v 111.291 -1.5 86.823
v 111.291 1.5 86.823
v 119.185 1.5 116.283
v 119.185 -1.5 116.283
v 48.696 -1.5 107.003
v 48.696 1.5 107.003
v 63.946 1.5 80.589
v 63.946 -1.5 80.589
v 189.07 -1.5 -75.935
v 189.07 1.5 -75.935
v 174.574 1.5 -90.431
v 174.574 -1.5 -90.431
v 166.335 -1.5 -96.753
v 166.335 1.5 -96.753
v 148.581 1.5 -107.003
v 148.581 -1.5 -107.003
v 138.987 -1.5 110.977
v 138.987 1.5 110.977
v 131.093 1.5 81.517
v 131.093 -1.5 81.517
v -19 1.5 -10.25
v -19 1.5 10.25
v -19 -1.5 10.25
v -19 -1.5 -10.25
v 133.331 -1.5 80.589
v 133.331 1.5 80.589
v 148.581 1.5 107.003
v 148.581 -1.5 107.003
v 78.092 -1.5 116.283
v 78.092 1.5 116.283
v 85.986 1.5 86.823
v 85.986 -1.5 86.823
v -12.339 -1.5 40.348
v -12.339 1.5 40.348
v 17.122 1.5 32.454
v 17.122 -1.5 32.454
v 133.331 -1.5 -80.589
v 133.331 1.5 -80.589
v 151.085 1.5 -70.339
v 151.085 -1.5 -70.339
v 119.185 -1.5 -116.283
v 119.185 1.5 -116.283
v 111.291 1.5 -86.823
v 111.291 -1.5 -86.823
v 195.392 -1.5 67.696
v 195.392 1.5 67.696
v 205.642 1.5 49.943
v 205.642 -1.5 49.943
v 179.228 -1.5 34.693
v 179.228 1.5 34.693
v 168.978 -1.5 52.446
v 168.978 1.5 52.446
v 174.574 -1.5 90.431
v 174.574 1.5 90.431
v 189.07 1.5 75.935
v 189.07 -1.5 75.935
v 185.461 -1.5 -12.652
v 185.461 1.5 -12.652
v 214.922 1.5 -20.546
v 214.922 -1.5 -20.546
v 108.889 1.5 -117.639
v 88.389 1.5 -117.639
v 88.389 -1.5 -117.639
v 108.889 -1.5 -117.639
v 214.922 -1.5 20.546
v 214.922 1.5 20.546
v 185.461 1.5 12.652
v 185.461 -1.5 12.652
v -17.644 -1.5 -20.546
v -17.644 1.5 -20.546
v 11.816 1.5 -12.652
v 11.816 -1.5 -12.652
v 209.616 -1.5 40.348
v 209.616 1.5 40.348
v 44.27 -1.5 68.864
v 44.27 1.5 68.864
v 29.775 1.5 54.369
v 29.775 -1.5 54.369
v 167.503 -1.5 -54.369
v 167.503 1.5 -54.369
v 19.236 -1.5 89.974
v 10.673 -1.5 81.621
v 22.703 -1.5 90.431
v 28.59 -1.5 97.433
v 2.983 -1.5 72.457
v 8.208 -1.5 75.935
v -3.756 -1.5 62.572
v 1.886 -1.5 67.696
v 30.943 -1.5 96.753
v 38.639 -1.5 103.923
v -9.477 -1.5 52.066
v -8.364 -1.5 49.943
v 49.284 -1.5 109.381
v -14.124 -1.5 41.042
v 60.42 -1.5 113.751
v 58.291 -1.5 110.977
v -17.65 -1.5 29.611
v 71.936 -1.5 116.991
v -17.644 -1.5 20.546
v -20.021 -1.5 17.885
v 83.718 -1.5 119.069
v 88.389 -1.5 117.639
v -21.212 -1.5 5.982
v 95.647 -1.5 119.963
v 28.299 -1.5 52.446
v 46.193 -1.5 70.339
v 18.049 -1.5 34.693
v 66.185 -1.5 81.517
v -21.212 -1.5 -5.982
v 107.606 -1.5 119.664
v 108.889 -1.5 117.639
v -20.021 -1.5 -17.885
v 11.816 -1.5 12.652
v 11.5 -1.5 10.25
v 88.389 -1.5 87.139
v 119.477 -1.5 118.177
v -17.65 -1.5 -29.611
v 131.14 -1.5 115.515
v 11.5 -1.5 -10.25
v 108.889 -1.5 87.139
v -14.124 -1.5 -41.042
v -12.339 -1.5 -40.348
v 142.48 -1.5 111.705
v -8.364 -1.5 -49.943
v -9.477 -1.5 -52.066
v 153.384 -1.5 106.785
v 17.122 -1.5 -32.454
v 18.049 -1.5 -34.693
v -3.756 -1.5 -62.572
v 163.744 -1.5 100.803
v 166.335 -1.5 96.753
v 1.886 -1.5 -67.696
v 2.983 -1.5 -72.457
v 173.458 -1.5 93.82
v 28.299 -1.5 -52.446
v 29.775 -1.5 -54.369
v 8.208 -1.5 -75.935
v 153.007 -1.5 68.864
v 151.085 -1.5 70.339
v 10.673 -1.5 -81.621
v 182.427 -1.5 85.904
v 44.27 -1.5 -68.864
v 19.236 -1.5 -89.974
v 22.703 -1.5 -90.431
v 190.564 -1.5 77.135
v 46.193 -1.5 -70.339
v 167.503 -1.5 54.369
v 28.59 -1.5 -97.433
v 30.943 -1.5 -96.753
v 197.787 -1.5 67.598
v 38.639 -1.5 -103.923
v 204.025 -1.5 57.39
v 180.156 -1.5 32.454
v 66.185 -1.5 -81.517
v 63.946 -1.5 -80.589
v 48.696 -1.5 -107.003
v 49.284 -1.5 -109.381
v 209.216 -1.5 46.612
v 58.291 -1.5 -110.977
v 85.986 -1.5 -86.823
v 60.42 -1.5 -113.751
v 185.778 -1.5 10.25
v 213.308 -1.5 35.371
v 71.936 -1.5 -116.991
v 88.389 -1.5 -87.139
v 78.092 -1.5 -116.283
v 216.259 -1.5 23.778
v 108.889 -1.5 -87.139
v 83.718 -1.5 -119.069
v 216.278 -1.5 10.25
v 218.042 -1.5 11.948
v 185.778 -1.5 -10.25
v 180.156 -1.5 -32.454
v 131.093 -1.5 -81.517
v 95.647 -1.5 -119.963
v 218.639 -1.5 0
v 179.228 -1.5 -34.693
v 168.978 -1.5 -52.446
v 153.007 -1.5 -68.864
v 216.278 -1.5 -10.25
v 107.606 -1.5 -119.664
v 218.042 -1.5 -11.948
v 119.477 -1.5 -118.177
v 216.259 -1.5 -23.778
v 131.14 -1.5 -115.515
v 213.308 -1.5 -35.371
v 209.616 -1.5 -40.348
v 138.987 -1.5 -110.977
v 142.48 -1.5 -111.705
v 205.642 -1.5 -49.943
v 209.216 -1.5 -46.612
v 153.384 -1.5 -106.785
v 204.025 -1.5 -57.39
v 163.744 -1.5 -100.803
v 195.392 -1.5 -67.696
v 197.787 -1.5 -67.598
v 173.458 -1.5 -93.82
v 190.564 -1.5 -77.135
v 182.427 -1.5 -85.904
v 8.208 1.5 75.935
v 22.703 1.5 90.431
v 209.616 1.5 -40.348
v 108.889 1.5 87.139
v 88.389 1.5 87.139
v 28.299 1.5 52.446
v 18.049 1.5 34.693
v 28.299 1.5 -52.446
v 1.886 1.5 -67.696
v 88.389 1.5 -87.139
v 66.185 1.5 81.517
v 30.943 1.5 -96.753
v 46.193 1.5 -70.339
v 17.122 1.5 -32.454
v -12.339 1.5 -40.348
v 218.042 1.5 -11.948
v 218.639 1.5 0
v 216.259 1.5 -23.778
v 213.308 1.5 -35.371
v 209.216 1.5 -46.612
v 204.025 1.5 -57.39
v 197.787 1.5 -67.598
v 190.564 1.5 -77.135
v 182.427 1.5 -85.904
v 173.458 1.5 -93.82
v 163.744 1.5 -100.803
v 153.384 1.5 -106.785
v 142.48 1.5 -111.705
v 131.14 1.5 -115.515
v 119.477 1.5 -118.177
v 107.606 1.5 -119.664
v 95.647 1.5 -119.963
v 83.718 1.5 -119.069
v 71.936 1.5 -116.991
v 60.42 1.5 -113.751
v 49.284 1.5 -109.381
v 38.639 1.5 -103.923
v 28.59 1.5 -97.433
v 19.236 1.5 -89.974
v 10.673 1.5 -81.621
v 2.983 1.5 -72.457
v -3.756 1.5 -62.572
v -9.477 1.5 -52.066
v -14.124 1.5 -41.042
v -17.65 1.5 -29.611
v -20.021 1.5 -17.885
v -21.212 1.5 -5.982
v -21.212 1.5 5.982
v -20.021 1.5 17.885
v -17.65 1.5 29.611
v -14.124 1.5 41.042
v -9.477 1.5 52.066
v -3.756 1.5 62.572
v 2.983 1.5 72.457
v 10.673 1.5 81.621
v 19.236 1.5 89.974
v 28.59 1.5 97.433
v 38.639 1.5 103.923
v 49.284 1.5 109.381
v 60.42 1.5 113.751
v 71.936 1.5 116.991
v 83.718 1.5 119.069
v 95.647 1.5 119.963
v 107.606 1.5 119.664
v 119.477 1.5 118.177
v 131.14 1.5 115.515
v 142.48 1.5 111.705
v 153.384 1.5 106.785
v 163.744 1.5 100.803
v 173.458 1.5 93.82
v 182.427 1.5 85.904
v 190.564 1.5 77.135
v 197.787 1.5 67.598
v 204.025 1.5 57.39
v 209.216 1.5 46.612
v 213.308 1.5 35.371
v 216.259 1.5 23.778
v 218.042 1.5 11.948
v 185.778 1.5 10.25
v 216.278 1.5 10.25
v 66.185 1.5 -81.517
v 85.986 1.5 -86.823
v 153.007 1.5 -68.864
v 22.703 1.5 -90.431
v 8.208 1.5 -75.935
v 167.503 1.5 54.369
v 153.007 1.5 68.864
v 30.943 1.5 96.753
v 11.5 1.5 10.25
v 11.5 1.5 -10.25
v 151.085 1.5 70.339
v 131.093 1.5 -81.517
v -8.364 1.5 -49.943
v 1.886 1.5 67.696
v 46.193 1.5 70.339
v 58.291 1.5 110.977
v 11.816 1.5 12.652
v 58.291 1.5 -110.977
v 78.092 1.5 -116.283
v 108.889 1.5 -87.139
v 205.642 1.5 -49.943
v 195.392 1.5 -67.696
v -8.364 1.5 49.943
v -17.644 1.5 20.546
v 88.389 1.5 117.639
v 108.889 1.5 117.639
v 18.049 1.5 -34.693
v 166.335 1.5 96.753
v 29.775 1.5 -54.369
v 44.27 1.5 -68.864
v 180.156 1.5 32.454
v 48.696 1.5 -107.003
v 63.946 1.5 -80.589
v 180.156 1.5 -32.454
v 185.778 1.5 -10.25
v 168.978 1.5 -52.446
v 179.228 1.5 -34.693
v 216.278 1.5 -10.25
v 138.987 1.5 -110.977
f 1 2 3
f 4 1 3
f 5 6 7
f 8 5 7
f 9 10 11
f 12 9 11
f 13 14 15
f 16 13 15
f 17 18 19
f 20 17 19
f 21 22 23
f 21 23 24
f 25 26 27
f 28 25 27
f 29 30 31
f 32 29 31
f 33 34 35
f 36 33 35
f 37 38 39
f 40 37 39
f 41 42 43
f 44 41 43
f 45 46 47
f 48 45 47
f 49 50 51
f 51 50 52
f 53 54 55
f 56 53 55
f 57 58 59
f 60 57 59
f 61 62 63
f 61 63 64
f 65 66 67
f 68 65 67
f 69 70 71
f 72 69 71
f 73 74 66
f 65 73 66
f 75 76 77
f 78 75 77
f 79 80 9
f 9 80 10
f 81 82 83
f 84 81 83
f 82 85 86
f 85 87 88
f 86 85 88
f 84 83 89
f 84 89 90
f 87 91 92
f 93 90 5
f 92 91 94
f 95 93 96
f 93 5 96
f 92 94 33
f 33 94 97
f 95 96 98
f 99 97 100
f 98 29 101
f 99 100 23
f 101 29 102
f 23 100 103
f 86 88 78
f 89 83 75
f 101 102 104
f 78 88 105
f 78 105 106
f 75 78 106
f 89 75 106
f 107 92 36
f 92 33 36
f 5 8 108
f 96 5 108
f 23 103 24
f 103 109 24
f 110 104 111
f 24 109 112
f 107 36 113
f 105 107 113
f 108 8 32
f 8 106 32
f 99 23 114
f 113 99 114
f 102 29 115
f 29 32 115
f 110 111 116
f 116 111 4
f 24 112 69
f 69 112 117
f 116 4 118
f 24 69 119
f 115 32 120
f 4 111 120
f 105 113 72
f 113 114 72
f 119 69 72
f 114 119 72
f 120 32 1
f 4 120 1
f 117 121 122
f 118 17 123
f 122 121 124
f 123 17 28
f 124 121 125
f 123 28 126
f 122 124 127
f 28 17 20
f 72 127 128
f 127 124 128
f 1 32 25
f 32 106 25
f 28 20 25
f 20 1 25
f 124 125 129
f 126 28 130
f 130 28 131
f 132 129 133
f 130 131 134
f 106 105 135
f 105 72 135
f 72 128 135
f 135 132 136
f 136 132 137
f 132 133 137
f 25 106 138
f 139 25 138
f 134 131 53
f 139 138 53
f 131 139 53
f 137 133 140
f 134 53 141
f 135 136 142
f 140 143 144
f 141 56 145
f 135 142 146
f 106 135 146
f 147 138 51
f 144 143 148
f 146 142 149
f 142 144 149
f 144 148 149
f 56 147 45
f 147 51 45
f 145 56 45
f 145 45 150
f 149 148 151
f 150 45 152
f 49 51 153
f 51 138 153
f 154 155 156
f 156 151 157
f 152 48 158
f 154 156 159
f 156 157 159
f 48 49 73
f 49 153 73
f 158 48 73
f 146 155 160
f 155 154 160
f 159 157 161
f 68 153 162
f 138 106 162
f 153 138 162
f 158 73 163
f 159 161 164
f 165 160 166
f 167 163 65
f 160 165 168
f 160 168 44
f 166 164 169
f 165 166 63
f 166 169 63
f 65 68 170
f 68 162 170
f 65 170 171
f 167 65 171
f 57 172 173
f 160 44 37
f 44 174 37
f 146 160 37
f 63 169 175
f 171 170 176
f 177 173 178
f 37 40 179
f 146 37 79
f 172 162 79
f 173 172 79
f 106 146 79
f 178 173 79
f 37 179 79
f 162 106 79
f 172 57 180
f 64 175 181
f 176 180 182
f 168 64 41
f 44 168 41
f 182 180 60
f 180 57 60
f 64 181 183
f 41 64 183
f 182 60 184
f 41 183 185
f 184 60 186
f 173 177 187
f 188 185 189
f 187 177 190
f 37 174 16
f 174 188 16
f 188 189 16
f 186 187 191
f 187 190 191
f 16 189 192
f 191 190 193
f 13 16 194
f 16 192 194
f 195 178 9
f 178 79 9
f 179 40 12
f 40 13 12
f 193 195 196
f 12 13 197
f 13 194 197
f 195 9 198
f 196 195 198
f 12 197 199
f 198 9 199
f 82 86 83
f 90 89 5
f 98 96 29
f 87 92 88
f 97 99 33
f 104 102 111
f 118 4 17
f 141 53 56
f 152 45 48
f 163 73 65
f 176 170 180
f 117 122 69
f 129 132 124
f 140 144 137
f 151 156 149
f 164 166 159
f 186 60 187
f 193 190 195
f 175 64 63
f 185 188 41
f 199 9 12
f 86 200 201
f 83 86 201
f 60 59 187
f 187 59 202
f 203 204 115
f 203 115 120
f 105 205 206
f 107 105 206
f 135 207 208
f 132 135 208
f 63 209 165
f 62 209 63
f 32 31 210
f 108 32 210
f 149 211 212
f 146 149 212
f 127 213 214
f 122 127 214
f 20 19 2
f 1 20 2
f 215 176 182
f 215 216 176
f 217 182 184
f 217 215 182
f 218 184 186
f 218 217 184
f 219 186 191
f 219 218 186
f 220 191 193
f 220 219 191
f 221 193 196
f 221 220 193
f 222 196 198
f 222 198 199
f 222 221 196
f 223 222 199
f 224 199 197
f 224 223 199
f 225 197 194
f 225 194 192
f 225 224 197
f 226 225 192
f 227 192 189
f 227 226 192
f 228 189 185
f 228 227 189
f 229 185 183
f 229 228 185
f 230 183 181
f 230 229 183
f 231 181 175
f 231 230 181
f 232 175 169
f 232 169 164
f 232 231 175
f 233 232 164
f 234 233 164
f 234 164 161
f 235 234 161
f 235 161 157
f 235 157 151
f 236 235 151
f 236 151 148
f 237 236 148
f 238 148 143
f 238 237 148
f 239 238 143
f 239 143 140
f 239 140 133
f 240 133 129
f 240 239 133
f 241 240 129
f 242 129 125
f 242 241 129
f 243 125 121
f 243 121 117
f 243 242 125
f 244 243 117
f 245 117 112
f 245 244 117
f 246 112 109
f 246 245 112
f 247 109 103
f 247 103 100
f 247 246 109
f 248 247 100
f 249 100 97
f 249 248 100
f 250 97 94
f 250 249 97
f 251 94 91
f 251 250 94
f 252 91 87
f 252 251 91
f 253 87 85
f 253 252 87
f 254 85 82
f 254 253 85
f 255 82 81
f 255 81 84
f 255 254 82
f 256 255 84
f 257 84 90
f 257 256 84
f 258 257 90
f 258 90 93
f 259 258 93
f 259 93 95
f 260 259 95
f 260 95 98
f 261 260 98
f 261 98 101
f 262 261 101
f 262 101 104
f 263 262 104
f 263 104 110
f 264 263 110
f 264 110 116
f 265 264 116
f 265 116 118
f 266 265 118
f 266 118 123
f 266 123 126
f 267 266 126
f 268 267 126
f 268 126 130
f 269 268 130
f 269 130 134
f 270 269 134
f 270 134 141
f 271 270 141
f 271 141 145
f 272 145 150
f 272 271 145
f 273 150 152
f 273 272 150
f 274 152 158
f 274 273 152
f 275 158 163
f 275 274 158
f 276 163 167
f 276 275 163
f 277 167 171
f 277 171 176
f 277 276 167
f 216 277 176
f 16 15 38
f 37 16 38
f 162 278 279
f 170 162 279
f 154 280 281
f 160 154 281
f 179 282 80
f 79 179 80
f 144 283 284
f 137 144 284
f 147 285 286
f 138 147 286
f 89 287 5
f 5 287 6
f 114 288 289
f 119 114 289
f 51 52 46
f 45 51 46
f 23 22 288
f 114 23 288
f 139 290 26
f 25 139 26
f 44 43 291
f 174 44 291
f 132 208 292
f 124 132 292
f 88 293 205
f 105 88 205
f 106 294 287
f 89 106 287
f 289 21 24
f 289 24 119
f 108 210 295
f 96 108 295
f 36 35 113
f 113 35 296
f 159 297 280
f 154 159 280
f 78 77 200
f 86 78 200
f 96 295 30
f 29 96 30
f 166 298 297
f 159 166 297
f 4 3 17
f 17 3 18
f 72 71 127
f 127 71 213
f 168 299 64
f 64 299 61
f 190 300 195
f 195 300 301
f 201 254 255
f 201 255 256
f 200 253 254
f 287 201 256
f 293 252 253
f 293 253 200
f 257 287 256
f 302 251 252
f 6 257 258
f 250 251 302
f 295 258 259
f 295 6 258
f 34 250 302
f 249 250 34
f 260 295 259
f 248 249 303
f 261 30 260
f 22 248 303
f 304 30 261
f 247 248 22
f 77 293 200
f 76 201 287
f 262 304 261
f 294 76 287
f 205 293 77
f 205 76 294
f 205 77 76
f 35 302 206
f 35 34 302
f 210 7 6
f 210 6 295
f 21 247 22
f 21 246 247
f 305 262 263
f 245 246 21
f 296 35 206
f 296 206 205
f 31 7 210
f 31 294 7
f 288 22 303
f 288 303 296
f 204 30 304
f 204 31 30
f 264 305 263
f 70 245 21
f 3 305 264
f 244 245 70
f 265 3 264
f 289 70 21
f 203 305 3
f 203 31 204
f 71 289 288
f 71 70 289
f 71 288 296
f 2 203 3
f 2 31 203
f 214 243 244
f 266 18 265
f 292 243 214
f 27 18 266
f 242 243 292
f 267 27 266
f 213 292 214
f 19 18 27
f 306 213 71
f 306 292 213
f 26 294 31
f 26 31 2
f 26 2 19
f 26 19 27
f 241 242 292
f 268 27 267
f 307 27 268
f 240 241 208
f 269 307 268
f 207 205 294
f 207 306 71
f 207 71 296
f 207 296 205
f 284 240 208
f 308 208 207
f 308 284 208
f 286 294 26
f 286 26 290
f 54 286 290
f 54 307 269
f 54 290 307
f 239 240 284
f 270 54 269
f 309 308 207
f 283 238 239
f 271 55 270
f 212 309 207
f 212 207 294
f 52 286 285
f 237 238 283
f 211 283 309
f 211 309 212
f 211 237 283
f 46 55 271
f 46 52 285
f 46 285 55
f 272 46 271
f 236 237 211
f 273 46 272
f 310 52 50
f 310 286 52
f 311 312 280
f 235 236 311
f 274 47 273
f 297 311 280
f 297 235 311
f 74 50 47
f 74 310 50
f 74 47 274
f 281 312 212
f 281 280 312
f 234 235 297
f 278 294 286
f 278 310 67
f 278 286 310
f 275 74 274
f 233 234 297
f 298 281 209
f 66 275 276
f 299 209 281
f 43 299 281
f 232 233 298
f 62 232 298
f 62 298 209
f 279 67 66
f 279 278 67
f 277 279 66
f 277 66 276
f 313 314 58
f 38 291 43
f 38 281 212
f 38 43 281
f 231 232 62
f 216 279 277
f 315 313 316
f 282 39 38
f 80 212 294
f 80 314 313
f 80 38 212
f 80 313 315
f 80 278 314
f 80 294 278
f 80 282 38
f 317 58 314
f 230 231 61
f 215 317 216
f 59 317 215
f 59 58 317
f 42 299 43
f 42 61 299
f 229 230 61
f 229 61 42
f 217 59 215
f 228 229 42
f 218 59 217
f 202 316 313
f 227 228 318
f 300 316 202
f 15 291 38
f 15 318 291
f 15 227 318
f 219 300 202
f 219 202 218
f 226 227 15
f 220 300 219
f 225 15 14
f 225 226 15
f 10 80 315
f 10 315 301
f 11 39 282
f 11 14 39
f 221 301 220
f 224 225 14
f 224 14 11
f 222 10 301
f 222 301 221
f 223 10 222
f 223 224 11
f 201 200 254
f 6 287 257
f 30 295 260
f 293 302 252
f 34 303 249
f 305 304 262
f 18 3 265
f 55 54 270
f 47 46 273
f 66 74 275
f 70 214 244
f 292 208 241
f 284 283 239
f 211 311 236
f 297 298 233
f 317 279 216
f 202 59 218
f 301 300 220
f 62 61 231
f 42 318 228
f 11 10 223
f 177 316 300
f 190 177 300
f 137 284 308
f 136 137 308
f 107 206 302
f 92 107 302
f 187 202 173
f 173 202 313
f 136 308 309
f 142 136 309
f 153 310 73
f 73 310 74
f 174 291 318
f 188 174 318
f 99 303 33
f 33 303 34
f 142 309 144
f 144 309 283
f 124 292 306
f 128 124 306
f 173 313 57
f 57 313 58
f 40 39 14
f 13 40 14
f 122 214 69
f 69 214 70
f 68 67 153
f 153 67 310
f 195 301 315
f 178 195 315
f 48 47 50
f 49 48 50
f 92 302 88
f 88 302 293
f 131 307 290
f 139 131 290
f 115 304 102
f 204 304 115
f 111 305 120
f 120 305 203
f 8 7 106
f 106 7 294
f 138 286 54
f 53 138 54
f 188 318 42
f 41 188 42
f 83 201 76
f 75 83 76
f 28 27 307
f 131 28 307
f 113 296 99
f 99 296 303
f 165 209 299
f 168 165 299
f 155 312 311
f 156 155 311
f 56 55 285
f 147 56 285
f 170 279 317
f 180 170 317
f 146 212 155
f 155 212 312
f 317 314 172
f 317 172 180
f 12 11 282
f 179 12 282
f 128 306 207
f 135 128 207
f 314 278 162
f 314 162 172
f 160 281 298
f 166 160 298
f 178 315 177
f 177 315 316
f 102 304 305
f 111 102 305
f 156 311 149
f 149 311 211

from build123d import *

# Parameters (mm, degrees)
SKETCH1_R           = 120
BOSS_EXTRUDE1_DEPTH = 1.5
SKETCH6_W           = 30.5
SKETCH6_H           = 20.5
SKETCH6_W_2         = 20.5
SKETCH6_H_2         = 30.5
CUT_EXTRUDE1_DEPTH  = 10.5


with BuildPart() as part:
    # Sketch1 → Boss-Extrude1 (new, symmetric)
    with BuildSketch(Plane(origin=(0, 0, 0), x_dir=(1, 0, 0), z_dir=(0, 1, 0))):
        with Locations((98.638798209, 0)):
            Circle(SKETCH1_R)
    extrude(amount=BOSS_EXTRUDE1_DEPTH, both=True)

    # Sketch6 → Cut-Extrude1 (cut)
    with BuildSketch(Plane(origin=(0, 1.5, 0), x_dir=(1, 0, 0), z_dir=(0, 1, 0))):
        with Locations((-3.75, 0)):
            Rectangle(SKETCH6_W, SKETCH6_H)
        Polygon((-12.338659942, 40.347901139), (-17.644450367, 20.5464217), (11.816287335, 12.652440824), (17.122077759, 32.453920263), align=None)
        Polygon((1.885610489, 67.696159493), (-8.364389511, 49.942638716), (18.049385305, 34.692638716), (28.299385305, 52.446159493), align=None)
        Polygon((22.703450772, 90.431036452), (8.207761758, 75.935347437), (29.774518584, 54.368590611), (44.270207598, 68.864279625), align=None)
        Polygon((48.696159493, 107.00318772), (30.942638716, 96.75318772), (46.192638716, 70.339412904), (63.946159493, 80.589412904), align=None)
        Polygon((78.092376509, 116.283248576), (58.29089707, 110.977458152), (66.184877946, 81.51672045), (85.986357385, 86.822510874), align=None)
        with Locations((98.638798209, 102.388798209)):
            Rectangle(SKETCH6_W_2, SKETCH6_H_2)
        Polygon((138.986699348, 110.977458152), (119.185219909, 116.283248576), (111.291239034, 86.822510874), (131.092718473, 81.51672045), align=None)
        Polygon((166.334957703, 96.75318772), (148.581436925, 107.00318772), (133.331436925, 80.589412904), (151.084957703, 70.339412904), align=None)
        Polygon((189.069834661, 75.935347437), (174.574145646, 90.431036452), (153.00738882, 68.864279625), (167.503077834, 54.368590611), align=None)
        Polygon((205.641985929, 49.942638716), (195.391985929, 67.696159493), (168.978211114, 52.446159493), (179.228211114, 34.692638716), align=None)
        Polygon((214.922046785, 20.5464217), (209.616256361, 40.347901139), (180.155518659, 32.453920263), (185.461309084, 12.652440824), align=None)
        with Locations((201.027596418, 0)):
            Rectangle(SKETCH6_W, SKETCH6_H)
        Polygon((209.616256361, -40.347901139), (214.922046785, -20.5464217), (185.461309084, -12.652440824), (180.155518659, -32.453920263), align=None)
        Polygon((195.391985929, -67.696159493), (205.641985929, -49.942638716), (179.228211114, -34.692638716), (168.978211114, -52.446159493), align=None)
        Polygon((174.574145646, -90.431036451), (189.069834661, -75.935347437), (167.503077835, -54.368590611), (153.00738882, -68.864279625), align=None)
        Polygon((148.581436925, -107.00318772), (166.334957703, -96.75318772), (151.084957703, -70.339412904), (133.331436925, -80.589412904), align=None)
        Polygon((119.185219909, -116.283248576), (138.986699348, -110.977458152), (131.092718473, -81.51672045), (111.291239034, -86.822510874), align=None)
        with Locations((98.638798209, -102.388798209)):
            Rectangle(SKETCH6_W_2, SKETCH6_H_2)
        Polygon((58.29089707, -110.977458152), (78.092376509, -116.283248576), (85.986357385, -86.822510874), (66.184877946, -81.51672045), align=None)
        Polygon((30.942638716, -96.75318772), (48.696159493, -107.00318772), (63.946159493, -80.589412904), (46.192638716, -70.339412904), align=None)
        Polygon((8.207761758, -75.935347437), (22.703450772, -90.431036452), (44.270207598, -68.864279625), (29.774518584, -54.368590611), align=None)
        Polygon((-8.364389511, -49.942638716), (1.885610489, -67.696159493), (28.299385305, -52.446159493), (18.049385305, -34.692638716), align=None)
        Polygon((-17.644450367, -20.5464217), (-12.338659942, -40.347901139), (17.122077759, -32.453920263), (11.816287335, -12.652440824), align=None)
    extrude(amount=-CUT_EXTRUDE1_DEPTH, mode=Mode.SUBTRACT)


solid = part.part
